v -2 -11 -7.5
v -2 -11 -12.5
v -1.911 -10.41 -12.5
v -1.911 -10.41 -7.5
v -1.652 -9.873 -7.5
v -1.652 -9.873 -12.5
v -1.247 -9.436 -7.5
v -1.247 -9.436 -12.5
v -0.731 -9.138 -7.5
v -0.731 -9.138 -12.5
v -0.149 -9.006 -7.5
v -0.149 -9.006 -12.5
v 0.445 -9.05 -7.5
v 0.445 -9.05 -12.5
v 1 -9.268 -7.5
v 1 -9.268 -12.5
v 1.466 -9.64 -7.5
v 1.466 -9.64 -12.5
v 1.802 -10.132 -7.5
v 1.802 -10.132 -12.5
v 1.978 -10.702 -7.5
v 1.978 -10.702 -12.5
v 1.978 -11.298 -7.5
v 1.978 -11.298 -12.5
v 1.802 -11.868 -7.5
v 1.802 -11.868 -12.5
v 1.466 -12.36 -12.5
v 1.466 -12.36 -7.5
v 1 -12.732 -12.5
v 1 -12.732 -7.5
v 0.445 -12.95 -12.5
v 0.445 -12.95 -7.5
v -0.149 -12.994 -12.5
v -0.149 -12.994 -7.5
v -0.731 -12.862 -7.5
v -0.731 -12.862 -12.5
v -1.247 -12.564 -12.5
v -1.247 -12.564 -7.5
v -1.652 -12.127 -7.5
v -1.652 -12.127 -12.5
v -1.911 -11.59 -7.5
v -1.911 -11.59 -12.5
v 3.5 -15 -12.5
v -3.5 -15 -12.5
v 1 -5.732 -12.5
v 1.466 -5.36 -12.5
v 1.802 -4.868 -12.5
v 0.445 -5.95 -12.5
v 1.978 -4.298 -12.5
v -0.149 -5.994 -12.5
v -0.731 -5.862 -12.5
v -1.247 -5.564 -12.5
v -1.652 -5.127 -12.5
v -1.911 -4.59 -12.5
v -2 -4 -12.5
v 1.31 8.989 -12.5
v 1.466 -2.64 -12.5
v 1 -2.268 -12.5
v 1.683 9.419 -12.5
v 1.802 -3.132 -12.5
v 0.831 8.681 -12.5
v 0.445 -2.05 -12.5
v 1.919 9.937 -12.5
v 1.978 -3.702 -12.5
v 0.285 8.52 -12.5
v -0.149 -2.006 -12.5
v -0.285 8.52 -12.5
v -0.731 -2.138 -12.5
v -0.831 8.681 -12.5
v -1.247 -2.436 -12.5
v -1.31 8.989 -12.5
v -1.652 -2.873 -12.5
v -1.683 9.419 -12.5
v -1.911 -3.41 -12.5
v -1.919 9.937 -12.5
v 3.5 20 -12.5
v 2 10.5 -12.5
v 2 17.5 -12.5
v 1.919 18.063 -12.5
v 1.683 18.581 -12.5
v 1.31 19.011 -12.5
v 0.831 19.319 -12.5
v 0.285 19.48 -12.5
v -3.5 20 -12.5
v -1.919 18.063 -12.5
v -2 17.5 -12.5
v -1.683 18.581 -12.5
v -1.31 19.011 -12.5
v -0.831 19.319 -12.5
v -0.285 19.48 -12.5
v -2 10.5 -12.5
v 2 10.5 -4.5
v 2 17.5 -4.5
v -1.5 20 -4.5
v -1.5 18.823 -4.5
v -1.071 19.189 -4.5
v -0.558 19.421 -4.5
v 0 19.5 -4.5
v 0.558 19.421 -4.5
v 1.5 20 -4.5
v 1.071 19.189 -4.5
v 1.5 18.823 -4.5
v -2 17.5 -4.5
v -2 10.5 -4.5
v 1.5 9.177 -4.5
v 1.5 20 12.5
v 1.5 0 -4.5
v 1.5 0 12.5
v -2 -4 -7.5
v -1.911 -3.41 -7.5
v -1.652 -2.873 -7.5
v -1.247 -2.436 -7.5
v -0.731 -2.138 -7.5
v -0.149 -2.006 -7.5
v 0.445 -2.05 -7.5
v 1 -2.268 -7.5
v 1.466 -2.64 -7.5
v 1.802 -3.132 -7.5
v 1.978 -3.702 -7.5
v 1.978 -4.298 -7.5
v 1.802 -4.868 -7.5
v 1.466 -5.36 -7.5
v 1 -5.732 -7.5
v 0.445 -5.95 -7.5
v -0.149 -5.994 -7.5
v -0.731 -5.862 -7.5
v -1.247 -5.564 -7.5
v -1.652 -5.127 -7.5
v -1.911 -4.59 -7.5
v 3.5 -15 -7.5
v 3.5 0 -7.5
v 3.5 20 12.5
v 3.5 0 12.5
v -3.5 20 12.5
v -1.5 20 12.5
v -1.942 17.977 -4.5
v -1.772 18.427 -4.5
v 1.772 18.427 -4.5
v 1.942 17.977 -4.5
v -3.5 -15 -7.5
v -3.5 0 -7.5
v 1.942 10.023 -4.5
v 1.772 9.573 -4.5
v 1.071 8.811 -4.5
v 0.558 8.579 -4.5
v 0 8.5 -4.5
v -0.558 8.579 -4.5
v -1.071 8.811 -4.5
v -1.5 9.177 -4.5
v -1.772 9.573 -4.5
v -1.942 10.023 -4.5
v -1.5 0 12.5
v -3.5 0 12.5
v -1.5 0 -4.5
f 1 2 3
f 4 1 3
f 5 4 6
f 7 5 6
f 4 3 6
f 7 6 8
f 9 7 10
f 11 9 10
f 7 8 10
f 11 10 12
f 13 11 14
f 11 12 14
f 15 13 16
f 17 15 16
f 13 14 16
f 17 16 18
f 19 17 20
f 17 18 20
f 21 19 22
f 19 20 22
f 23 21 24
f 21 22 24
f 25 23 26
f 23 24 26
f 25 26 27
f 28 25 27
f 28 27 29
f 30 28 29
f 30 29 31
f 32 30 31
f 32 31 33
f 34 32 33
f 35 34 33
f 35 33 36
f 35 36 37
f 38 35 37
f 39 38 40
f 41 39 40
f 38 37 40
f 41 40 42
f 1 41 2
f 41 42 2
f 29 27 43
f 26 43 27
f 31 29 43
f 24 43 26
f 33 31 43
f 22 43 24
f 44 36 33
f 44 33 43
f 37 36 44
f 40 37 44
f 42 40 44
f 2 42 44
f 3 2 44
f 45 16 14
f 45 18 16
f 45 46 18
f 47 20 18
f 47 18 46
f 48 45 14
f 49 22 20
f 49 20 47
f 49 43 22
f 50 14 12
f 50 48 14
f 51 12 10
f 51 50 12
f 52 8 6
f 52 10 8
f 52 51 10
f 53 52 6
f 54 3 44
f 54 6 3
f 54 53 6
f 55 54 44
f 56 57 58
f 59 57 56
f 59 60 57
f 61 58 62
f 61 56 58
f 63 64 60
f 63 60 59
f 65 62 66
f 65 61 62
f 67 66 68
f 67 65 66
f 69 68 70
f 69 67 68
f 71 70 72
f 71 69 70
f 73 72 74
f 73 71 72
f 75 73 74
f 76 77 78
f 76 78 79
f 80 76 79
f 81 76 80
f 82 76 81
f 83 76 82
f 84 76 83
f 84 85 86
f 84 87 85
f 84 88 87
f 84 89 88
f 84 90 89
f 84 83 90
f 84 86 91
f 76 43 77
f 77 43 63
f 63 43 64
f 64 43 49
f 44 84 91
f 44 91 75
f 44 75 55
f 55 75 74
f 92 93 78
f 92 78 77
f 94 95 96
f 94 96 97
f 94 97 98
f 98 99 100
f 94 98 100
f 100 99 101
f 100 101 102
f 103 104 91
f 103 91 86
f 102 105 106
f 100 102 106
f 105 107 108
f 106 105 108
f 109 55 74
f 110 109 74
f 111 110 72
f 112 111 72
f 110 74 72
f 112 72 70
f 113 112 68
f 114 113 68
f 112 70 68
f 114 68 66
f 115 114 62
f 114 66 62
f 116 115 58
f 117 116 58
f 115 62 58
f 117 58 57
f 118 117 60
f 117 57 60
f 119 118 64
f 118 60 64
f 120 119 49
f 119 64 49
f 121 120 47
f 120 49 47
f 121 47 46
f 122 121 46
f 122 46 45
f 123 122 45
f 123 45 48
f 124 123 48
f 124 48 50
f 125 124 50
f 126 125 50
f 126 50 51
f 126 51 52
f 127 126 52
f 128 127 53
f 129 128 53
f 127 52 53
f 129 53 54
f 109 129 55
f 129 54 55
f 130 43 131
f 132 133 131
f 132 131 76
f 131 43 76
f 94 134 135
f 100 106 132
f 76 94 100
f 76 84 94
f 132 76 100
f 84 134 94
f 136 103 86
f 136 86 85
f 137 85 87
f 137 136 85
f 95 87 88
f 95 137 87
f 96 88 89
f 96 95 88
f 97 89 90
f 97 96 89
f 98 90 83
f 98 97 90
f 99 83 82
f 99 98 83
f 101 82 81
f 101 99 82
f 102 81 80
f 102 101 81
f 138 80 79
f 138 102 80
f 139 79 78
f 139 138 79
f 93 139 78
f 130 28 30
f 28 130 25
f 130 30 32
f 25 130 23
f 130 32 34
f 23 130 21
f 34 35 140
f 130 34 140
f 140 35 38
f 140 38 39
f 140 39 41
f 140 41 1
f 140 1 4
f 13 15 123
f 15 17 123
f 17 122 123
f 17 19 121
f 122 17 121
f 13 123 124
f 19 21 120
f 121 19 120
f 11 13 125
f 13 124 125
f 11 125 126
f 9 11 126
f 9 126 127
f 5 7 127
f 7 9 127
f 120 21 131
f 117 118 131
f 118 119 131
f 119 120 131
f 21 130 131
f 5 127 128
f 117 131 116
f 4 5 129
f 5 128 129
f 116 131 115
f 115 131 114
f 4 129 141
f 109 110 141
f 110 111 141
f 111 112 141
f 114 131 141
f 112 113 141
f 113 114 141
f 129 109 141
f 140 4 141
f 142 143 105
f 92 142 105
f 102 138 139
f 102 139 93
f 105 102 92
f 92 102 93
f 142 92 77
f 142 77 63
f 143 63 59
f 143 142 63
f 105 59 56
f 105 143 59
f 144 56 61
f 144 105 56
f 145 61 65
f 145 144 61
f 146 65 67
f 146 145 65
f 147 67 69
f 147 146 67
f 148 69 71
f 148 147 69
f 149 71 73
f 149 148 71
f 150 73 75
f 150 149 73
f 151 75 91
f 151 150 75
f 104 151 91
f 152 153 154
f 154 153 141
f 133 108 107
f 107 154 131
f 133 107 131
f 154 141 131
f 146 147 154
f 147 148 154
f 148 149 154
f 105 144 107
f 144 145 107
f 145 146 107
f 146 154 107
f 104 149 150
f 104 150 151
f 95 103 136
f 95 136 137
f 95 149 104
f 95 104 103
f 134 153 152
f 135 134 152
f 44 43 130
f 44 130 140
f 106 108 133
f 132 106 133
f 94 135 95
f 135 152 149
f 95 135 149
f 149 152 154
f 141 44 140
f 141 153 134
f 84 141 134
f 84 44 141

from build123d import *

# Parameters (mm, degrees)
BOSS_EXTRUDE1_DEPTH = 20
CUT_EXTRUDE3_DEPTH  = 8
SKETCH4_W           = 7
SKETCH4_H           = 15
SKETCH4_R           = 2
BOSS_EXTRUDE2_DEPTH = 5


with BuildPart() as part:
    # Sketch1 → Boss-Extrude1 (new body)
    with BuildSketch(Plane(origin=(0, 0, 0), x_dir=(1, 0, 0), z_dir=(0, 1, 0))):
        Polygon((-1.5, -12.5), (-1.5, 4.5), (1.5, 4.5), (1.5, -12.5), (3.5, -12.5), (3.5, 12.5), (-3.5, 12.5), (-3.5, -12.5), align=None)
    extrude(amount=BOSS_EXTRUDE1_DEPTH)

    # Sketch2 → Cut-Extrude3 (cut)
    with BuildSketch(Plane.XY.offset(-4.5)):
        with BuildLine():
            Line((2, 17.5), (2, 10.5))
            ThreePointArc((2, 10.5), (0, 8.5), (-2, 10.5))
            Line((-2, 10.5), (-2, 17.5))
            ThreePointArc((-2, 17.5), (0, 19.5), (2, 17.5))
        make_face()
    extrude(amount=-CUT_EXTRUDE3_DEPTH, mode=Mode.SUBTRACT)

    # Sketch4 → Boss-Extrude2 (add)
    with BuildSketch(Plane(origin=(0, 0, -12.5), x_dir=(-1, 0, 0), z_dir=(0, 0, -1))):
        with Locations((0, -7.5)):
            Rectangle(SKETCH4_W, SKETCH4_H)
        with Locations((0, -4)):
            Circle(SKETCH4_R, mode=Mode.SUBTRACT)
        with Locations((0, -11)):
            Circle(SKETCH4_R, mode=Mode.SUBTRACT)
    extrude(amount=-BOSS_EXTRUDE2_DEPTH)


solid = part.part
